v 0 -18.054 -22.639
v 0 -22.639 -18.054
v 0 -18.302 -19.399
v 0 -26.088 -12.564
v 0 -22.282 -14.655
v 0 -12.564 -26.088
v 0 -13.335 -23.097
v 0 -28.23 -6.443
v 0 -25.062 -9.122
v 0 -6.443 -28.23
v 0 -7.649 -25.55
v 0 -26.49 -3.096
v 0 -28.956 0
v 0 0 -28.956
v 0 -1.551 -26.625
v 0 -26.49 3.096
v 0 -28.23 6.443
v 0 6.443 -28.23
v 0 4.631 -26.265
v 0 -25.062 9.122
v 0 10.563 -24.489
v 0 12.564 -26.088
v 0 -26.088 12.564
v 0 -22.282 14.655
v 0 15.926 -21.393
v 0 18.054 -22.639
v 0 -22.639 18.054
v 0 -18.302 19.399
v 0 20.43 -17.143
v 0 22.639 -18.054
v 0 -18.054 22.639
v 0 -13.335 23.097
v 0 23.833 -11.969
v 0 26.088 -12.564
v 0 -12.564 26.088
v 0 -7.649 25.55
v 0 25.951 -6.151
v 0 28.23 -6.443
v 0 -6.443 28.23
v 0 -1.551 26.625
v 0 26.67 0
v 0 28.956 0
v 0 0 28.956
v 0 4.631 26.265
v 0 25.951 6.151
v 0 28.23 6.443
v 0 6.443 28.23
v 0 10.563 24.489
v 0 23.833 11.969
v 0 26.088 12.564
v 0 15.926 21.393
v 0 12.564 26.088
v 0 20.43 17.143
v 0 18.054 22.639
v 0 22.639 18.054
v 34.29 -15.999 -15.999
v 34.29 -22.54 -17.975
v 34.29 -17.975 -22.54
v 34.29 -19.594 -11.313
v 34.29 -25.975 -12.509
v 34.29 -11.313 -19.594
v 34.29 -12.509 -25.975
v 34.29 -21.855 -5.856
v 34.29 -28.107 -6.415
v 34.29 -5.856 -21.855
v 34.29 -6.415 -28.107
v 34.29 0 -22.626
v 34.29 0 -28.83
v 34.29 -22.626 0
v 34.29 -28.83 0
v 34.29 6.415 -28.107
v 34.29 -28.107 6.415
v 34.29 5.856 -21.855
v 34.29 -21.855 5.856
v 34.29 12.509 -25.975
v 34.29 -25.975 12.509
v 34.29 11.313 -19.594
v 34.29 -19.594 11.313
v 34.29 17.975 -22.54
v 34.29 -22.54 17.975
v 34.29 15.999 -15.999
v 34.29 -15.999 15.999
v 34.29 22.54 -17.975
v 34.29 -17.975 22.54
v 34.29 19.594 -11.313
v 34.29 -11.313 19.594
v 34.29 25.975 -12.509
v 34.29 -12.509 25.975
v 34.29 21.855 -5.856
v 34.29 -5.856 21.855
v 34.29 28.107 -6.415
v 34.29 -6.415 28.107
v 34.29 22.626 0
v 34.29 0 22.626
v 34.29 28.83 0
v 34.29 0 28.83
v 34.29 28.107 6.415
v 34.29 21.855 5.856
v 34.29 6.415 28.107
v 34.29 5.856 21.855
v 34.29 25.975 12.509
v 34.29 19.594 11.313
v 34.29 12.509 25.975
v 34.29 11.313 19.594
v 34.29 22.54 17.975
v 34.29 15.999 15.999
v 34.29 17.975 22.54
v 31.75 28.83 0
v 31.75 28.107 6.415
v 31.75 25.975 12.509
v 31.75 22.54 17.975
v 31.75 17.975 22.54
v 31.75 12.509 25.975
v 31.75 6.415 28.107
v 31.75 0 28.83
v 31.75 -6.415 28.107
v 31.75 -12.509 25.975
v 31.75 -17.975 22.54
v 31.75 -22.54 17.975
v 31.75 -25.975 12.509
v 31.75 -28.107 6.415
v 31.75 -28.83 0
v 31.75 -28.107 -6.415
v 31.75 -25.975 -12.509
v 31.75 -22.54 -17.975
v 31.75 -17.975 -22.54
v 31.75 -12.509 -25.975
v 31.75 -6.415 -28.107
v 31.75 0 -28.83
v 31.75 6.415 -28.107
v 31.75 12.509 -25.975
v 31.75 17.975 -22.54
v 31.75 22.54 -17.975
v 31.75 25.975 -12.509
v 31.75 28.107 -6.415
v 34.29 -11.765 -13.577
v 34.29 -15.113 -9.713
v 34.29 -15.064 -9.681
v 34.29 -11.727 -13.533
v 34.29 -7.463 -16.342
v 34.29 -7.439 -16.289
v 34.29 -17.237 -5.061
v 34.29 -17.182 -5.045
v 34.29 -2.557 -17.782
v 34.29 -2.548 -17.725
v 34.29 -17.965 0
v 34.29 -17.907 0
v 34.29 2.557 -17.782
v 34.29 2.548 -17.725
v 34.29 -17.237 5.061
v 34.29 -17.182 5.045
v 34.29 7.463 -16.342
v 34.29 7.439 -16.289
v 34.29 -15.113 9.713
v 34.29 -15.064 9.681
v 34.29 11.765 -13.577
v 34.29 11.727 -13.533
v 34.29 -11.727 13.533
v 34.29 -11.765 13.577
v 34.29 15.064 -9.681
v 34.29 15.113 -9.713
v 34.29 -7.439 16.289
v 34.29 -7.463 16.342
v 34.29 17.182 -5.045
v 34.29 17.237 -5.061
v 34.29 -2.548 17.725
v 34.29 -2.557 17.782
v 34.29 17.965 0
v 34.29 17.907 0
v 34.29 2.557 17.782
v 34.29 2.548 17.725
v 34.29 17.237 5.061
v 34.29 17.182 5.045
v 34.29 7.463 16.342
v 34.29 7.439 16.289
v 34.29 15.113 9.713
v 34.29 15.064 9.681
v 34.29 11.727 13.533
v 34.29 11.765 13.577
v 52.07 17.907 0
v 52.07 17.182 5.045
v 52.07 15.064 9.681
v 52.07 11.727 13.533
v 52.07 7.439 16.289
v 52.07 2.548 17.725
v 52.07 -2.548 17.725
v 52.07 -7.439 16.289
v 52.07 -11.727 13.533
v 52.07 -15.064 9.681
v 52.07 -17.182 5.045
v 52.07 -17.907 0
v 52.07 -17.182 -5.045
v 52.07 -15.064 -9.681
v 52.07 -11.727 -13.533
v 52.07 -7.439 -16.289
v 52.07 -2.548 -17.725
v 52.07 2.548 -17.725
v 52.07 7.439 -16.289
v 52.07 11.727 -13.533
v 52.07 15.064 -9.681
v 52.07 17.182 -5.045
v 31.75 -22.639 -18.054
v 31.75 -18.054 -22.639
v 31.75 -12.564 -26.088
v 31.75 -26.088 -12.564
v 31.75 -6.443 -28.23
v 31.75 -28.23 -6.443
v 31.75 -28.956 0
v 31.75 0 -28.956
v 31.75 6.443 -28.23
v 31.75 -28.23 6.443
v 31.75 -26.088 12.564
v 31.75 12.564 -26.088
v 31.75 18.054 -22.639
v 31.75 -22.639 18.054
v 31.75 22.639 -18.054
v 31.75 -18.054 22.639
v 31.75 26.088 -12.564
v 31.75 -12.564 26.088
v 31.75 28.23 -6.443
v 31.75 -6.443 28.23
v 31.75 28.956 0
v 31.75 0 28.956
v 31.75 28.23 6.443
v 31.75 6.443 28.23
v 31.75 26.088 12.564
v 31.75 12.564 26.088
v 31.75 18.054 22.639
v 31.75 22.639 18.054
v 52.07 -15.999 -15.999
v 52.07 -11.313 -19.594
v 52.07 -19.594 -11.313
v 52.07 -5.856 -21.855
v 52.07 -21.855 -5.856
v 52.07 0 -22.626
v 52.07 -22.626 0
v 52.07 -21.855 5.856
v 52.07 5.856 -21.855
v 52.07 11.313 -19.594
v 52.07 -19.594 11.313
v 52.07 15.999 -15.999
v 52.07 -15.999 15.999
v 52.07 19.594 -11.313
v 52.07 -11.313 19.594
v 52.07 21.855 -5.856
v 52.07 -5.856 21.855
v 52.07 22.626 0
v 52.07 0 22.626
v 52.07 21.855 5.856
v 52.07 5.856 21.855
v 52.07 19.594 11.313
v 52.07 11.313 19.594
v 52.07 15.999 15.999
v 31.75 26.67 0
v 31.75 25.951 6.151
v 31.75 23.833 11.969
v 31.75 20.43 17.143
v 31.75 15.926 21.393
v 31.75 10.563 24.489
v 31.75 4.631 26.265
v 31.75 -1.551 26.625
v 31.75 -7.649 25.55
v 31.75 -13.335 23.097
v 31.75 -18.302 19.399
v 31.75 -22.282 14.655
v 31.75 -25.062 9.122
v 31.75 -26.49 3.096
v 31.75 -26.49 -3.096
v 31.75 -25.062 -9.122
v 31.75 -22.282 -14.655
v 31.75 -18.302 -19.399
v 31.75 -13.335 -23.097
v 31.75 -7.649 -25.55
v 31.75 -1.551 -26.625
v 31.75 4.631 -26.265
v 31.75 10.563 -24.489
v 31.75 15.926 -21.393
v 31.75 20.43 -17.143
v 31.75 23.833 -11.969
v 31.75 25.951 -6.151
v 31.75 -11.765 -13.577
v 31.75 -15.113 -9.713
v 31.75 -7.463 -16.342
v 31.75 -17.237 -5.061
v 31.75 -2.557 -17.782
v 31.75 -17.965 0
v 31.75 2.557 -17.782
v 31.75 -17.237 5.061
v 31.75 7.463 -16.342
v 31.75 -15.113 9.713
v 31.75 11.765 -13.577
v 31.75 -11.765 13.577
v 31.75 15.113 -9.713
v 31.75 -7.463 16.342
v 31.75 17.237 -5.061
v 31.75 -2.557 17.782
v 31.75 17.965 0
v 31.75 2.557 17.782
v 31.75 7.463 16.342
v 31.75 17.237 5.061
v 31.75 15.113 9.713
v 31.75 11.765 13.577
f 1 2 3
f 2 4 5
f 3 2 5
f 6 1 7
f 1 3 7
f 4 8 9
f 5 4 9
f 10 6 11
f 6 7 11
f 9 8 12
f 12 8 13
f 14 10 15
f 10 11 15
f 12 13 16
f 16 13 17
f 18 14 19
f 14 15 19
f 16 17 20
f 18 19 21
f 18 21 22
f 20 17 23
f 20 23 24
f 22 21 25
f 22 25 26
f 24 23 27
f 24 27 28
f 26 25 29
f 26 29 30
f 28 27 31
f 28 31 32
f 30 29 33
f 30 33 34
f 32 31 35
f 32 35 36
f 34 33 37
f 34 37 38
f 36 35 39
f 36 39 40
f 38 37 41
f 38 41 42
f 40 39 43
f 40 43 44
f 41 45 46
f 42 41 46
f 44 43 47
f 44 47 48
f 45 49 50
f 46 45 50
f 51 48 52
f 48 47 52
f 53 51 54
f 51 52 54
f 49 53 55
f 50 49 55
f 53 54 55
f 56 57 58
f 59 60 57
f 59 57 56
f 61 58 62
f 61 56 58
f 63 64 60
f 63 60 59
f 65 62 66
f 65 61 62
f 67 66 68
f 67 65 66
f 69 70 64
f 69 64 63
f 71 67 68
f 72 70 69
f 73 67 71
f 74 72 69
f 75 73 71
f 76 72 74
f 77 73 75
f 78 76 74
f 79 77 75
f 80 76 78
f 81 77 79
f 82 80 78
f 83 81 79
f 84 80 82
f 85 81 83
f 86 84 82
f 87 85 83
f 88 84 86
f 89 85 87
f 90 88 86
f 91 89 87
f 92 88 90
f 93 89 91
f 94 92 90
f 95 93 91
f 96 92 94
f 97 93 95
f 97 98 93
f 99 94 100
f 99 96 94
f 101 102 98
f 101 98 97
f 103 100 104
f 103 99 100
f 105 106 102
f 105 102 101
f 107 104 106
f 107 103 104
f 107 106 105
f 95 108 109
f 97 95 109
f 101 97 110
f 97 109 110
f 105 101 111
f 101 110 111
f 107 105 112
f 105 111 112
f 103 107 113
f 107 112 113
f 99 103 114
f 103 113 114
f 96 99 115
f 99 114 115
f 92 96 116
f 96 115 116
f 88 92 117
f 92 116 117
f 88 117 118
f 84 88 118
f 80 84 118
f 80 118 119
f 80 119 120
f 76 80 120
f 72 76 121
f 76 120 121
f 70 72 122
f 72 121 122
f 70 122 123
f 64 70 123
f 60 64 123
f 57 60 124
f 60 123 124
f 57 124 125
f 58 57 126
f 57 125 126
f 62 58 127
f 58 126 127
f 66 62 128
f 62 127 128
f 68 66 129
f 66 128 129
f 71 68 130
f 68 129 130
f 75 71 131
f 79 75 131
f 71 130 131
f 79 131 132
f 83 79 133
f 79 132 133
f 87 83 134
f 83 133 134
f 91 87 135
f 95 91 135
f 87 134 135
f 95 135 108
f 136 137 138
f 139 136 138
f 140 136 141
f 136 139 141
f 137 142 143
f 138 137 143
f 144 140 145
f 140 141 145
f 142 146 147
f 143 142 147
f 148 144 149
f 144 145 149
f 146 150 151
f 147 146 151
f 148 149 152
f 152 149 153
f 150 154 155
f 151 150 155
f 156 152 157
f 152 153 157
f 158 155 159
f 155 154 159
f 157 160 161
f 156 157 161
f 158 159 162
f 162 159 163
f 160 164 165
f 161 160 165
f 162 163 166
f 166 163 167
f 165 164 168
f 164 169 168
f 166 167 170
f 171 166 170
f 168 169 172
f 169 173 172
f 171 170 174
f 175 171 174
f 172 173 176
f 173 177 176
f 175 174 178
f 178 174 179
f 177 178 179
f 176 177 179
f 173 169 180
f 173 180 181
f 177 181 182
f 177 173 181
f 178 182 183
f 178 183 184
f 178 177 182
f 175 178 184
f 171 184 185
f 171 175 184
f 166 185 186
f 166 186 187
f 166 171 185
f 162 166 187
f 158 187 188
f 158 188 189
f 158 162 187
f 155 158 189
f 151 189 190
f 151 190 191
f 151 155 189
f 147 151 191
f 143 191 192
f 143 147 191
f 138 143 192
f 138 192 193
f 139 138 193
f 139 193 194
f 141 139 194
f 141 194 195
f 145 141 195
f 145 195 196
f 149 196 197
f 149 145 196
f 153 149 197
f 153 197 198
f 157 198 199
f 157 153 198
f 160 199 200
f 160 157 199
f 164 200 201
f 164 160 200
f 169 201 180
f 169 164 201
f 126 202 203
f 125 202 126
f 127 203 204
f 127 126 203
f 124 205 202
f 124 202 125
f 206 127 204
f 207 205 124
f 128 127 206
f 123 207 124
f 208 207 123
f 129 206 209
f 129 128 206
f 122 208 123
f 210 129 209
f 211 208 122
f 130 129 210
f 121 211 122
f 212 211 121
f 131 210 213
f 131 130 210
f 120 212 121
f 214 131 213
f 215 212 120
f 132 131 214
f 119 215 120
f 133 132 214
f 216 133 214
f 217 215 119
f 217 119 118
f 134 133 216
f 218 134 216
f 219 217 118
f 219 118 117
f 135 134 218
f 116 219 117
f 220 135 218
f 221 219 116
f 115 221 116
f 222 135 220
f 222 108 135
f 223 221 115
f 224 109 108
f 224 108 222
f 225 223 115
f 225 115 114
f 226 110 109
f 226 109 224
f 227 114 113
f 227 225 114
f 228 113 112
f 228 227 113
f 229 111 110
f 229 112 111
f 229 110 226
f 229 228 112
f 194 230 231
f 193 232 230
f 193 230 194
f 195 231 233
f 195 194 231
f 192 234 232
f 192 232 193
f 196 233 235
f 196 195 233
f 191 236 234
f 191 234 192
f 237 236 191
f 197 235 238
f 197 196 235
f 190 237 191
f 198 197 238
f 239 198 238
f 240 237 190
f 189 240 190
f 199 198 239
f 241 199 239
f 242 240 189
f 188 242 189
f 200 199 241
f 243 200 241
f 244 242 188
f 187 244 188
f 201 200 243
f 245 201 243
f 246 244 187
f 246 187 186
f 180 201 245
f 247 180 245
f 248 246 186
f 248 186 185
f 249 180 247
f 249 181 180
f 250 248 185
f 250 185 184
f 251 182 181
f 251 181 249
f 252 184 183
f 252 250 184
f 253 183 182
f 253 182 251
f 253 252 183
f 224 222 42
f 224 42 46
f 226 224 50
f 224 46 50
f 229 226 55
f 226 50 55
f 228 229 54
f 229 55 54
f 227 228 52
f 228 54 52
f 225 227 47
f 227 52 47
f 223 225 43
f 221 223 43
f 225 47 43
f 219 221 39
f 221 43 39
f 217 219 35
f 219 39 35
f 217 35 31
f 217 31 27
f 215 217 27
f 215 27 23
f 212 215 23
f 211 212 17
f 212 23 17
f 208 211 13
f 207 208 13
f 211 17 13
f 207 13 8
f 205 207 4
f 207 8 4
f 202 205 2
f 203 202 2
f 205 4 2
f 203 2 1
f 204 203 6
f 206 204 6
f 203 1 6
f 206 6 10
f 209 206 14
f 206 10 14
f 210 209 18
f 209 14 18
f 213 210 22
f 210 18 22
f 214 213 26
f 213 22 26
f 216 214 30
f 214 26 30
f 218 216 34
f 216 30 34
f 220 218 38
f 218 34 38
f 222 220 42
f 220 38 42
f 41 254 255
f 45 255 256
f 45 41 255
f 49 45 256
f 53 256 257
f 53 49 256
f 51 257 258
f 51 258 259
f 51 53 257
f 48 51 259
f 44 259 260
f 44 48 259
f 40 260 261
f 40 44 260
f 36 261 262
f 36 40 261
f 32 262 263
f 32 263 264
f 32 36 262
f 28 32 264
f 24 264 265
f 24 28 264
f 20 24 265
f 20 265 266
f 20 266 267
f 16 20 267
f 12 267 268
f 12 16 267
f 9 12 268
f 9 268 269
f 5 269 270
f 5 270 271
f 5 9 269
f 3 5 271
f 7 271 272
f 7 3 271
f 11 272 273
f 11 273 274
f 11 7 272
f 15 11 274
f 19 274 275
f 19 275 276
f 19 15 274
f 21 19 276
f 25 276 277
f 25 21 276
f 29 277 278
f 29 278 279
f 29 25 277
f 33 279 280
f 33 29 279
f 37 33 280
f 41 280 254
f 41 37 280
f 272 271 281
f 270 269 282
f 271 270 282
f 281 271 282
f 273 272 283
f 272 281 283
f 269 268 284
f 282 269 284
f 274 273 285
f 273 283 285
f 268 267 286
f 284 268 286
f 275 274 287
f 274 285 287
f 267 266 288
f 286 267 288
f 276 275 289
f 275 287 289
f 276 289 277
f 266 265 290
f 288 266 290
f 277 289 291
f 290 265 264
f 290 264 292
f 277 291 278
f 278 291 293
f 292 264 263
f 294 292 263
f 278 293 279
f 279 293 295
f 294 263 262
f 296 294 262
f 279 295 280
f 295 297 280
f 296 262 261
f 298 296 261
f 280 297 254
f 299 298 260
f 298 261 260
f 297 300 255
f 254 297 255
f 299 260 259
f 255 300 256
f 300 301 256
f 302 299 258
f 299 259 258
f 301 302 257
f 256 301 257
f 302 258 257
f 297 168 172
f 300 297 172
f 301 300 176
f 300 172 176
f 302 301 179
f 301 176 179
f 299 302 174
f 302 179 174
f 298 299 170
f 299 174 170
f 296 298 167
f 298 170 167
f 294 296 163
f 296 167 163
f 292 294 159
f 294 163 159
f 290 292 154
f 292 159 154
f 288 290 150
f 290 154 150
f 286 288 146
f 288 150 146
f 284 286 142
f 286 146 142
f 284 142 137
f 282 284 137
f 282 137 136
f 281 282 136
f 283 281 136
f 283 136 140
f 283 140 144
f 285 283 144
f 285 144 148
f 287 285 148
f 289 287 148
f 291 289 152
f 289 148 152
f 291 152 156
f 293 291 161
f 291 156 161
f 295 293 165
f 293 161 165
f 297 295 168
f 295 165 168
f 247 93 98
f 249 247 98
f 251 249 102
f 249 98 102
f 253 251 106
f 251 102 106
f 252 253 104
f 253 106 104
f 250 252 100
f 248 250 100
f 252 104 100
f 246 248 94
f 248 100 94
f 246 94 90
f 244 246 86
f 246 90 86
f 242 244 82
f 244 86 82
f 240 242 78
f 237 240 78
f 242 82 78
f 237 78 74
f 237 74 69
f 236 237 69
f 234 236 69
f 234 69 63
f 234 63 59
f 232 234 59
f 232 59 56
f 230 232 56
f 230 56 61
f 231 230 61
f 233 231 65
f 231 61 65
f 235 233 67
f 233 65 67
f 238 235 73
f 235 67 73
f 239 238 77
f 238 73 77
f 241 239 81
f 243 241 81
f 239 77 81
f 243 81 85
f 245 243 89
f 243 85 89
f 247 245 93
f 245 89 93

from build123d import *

# Parameters (mm, degrees)
F0_R     = 28.956
F0_R_2   = 26.67
F1_DEPTH = 31.75
F2_R     = 28.829682
F3_DEPTH = 2.54
F4_R     = 22.625614
F4_R_2   = 17.907
F5_DEPTH = 17.78
F6_R     = 17.965029
F7_DEPTH = 2.54


with BuildPart() as f1:
    # F0 (on Right) → F1 (new body)
    with BuildSketch(Plane.YZ):
        Circle(F0_R)
        Circle(F0_R_2, mode=Mode.SUBTRACT)
    extrude(amount=F1_DEPTH)

    # F2 (on face) → F3 (join)
    with BuildSketch(Plane.YZ.offset(31.75)):
        Circle(F2_R)
    extrude(amount=F3_DEPTH)

    # F4 (on face) → F5 (join)
    with BuildSketch(Plane.YZ.offset(34.29)):
        Circle(F4_R)
        Circle(F4_R_2, mode=Mode.SUBTRACT)
    extrude(amount=F5_DEPTH)

    # F6 (on face) → F7 (cut, through all)
    with BuildSketch(Plane.YZ.offset(34.29)):
        Circle(F6_R)
    extrude(amount=-F7_DEPTH, mode=Mode.SUBTRACT)


solid = f1.part
